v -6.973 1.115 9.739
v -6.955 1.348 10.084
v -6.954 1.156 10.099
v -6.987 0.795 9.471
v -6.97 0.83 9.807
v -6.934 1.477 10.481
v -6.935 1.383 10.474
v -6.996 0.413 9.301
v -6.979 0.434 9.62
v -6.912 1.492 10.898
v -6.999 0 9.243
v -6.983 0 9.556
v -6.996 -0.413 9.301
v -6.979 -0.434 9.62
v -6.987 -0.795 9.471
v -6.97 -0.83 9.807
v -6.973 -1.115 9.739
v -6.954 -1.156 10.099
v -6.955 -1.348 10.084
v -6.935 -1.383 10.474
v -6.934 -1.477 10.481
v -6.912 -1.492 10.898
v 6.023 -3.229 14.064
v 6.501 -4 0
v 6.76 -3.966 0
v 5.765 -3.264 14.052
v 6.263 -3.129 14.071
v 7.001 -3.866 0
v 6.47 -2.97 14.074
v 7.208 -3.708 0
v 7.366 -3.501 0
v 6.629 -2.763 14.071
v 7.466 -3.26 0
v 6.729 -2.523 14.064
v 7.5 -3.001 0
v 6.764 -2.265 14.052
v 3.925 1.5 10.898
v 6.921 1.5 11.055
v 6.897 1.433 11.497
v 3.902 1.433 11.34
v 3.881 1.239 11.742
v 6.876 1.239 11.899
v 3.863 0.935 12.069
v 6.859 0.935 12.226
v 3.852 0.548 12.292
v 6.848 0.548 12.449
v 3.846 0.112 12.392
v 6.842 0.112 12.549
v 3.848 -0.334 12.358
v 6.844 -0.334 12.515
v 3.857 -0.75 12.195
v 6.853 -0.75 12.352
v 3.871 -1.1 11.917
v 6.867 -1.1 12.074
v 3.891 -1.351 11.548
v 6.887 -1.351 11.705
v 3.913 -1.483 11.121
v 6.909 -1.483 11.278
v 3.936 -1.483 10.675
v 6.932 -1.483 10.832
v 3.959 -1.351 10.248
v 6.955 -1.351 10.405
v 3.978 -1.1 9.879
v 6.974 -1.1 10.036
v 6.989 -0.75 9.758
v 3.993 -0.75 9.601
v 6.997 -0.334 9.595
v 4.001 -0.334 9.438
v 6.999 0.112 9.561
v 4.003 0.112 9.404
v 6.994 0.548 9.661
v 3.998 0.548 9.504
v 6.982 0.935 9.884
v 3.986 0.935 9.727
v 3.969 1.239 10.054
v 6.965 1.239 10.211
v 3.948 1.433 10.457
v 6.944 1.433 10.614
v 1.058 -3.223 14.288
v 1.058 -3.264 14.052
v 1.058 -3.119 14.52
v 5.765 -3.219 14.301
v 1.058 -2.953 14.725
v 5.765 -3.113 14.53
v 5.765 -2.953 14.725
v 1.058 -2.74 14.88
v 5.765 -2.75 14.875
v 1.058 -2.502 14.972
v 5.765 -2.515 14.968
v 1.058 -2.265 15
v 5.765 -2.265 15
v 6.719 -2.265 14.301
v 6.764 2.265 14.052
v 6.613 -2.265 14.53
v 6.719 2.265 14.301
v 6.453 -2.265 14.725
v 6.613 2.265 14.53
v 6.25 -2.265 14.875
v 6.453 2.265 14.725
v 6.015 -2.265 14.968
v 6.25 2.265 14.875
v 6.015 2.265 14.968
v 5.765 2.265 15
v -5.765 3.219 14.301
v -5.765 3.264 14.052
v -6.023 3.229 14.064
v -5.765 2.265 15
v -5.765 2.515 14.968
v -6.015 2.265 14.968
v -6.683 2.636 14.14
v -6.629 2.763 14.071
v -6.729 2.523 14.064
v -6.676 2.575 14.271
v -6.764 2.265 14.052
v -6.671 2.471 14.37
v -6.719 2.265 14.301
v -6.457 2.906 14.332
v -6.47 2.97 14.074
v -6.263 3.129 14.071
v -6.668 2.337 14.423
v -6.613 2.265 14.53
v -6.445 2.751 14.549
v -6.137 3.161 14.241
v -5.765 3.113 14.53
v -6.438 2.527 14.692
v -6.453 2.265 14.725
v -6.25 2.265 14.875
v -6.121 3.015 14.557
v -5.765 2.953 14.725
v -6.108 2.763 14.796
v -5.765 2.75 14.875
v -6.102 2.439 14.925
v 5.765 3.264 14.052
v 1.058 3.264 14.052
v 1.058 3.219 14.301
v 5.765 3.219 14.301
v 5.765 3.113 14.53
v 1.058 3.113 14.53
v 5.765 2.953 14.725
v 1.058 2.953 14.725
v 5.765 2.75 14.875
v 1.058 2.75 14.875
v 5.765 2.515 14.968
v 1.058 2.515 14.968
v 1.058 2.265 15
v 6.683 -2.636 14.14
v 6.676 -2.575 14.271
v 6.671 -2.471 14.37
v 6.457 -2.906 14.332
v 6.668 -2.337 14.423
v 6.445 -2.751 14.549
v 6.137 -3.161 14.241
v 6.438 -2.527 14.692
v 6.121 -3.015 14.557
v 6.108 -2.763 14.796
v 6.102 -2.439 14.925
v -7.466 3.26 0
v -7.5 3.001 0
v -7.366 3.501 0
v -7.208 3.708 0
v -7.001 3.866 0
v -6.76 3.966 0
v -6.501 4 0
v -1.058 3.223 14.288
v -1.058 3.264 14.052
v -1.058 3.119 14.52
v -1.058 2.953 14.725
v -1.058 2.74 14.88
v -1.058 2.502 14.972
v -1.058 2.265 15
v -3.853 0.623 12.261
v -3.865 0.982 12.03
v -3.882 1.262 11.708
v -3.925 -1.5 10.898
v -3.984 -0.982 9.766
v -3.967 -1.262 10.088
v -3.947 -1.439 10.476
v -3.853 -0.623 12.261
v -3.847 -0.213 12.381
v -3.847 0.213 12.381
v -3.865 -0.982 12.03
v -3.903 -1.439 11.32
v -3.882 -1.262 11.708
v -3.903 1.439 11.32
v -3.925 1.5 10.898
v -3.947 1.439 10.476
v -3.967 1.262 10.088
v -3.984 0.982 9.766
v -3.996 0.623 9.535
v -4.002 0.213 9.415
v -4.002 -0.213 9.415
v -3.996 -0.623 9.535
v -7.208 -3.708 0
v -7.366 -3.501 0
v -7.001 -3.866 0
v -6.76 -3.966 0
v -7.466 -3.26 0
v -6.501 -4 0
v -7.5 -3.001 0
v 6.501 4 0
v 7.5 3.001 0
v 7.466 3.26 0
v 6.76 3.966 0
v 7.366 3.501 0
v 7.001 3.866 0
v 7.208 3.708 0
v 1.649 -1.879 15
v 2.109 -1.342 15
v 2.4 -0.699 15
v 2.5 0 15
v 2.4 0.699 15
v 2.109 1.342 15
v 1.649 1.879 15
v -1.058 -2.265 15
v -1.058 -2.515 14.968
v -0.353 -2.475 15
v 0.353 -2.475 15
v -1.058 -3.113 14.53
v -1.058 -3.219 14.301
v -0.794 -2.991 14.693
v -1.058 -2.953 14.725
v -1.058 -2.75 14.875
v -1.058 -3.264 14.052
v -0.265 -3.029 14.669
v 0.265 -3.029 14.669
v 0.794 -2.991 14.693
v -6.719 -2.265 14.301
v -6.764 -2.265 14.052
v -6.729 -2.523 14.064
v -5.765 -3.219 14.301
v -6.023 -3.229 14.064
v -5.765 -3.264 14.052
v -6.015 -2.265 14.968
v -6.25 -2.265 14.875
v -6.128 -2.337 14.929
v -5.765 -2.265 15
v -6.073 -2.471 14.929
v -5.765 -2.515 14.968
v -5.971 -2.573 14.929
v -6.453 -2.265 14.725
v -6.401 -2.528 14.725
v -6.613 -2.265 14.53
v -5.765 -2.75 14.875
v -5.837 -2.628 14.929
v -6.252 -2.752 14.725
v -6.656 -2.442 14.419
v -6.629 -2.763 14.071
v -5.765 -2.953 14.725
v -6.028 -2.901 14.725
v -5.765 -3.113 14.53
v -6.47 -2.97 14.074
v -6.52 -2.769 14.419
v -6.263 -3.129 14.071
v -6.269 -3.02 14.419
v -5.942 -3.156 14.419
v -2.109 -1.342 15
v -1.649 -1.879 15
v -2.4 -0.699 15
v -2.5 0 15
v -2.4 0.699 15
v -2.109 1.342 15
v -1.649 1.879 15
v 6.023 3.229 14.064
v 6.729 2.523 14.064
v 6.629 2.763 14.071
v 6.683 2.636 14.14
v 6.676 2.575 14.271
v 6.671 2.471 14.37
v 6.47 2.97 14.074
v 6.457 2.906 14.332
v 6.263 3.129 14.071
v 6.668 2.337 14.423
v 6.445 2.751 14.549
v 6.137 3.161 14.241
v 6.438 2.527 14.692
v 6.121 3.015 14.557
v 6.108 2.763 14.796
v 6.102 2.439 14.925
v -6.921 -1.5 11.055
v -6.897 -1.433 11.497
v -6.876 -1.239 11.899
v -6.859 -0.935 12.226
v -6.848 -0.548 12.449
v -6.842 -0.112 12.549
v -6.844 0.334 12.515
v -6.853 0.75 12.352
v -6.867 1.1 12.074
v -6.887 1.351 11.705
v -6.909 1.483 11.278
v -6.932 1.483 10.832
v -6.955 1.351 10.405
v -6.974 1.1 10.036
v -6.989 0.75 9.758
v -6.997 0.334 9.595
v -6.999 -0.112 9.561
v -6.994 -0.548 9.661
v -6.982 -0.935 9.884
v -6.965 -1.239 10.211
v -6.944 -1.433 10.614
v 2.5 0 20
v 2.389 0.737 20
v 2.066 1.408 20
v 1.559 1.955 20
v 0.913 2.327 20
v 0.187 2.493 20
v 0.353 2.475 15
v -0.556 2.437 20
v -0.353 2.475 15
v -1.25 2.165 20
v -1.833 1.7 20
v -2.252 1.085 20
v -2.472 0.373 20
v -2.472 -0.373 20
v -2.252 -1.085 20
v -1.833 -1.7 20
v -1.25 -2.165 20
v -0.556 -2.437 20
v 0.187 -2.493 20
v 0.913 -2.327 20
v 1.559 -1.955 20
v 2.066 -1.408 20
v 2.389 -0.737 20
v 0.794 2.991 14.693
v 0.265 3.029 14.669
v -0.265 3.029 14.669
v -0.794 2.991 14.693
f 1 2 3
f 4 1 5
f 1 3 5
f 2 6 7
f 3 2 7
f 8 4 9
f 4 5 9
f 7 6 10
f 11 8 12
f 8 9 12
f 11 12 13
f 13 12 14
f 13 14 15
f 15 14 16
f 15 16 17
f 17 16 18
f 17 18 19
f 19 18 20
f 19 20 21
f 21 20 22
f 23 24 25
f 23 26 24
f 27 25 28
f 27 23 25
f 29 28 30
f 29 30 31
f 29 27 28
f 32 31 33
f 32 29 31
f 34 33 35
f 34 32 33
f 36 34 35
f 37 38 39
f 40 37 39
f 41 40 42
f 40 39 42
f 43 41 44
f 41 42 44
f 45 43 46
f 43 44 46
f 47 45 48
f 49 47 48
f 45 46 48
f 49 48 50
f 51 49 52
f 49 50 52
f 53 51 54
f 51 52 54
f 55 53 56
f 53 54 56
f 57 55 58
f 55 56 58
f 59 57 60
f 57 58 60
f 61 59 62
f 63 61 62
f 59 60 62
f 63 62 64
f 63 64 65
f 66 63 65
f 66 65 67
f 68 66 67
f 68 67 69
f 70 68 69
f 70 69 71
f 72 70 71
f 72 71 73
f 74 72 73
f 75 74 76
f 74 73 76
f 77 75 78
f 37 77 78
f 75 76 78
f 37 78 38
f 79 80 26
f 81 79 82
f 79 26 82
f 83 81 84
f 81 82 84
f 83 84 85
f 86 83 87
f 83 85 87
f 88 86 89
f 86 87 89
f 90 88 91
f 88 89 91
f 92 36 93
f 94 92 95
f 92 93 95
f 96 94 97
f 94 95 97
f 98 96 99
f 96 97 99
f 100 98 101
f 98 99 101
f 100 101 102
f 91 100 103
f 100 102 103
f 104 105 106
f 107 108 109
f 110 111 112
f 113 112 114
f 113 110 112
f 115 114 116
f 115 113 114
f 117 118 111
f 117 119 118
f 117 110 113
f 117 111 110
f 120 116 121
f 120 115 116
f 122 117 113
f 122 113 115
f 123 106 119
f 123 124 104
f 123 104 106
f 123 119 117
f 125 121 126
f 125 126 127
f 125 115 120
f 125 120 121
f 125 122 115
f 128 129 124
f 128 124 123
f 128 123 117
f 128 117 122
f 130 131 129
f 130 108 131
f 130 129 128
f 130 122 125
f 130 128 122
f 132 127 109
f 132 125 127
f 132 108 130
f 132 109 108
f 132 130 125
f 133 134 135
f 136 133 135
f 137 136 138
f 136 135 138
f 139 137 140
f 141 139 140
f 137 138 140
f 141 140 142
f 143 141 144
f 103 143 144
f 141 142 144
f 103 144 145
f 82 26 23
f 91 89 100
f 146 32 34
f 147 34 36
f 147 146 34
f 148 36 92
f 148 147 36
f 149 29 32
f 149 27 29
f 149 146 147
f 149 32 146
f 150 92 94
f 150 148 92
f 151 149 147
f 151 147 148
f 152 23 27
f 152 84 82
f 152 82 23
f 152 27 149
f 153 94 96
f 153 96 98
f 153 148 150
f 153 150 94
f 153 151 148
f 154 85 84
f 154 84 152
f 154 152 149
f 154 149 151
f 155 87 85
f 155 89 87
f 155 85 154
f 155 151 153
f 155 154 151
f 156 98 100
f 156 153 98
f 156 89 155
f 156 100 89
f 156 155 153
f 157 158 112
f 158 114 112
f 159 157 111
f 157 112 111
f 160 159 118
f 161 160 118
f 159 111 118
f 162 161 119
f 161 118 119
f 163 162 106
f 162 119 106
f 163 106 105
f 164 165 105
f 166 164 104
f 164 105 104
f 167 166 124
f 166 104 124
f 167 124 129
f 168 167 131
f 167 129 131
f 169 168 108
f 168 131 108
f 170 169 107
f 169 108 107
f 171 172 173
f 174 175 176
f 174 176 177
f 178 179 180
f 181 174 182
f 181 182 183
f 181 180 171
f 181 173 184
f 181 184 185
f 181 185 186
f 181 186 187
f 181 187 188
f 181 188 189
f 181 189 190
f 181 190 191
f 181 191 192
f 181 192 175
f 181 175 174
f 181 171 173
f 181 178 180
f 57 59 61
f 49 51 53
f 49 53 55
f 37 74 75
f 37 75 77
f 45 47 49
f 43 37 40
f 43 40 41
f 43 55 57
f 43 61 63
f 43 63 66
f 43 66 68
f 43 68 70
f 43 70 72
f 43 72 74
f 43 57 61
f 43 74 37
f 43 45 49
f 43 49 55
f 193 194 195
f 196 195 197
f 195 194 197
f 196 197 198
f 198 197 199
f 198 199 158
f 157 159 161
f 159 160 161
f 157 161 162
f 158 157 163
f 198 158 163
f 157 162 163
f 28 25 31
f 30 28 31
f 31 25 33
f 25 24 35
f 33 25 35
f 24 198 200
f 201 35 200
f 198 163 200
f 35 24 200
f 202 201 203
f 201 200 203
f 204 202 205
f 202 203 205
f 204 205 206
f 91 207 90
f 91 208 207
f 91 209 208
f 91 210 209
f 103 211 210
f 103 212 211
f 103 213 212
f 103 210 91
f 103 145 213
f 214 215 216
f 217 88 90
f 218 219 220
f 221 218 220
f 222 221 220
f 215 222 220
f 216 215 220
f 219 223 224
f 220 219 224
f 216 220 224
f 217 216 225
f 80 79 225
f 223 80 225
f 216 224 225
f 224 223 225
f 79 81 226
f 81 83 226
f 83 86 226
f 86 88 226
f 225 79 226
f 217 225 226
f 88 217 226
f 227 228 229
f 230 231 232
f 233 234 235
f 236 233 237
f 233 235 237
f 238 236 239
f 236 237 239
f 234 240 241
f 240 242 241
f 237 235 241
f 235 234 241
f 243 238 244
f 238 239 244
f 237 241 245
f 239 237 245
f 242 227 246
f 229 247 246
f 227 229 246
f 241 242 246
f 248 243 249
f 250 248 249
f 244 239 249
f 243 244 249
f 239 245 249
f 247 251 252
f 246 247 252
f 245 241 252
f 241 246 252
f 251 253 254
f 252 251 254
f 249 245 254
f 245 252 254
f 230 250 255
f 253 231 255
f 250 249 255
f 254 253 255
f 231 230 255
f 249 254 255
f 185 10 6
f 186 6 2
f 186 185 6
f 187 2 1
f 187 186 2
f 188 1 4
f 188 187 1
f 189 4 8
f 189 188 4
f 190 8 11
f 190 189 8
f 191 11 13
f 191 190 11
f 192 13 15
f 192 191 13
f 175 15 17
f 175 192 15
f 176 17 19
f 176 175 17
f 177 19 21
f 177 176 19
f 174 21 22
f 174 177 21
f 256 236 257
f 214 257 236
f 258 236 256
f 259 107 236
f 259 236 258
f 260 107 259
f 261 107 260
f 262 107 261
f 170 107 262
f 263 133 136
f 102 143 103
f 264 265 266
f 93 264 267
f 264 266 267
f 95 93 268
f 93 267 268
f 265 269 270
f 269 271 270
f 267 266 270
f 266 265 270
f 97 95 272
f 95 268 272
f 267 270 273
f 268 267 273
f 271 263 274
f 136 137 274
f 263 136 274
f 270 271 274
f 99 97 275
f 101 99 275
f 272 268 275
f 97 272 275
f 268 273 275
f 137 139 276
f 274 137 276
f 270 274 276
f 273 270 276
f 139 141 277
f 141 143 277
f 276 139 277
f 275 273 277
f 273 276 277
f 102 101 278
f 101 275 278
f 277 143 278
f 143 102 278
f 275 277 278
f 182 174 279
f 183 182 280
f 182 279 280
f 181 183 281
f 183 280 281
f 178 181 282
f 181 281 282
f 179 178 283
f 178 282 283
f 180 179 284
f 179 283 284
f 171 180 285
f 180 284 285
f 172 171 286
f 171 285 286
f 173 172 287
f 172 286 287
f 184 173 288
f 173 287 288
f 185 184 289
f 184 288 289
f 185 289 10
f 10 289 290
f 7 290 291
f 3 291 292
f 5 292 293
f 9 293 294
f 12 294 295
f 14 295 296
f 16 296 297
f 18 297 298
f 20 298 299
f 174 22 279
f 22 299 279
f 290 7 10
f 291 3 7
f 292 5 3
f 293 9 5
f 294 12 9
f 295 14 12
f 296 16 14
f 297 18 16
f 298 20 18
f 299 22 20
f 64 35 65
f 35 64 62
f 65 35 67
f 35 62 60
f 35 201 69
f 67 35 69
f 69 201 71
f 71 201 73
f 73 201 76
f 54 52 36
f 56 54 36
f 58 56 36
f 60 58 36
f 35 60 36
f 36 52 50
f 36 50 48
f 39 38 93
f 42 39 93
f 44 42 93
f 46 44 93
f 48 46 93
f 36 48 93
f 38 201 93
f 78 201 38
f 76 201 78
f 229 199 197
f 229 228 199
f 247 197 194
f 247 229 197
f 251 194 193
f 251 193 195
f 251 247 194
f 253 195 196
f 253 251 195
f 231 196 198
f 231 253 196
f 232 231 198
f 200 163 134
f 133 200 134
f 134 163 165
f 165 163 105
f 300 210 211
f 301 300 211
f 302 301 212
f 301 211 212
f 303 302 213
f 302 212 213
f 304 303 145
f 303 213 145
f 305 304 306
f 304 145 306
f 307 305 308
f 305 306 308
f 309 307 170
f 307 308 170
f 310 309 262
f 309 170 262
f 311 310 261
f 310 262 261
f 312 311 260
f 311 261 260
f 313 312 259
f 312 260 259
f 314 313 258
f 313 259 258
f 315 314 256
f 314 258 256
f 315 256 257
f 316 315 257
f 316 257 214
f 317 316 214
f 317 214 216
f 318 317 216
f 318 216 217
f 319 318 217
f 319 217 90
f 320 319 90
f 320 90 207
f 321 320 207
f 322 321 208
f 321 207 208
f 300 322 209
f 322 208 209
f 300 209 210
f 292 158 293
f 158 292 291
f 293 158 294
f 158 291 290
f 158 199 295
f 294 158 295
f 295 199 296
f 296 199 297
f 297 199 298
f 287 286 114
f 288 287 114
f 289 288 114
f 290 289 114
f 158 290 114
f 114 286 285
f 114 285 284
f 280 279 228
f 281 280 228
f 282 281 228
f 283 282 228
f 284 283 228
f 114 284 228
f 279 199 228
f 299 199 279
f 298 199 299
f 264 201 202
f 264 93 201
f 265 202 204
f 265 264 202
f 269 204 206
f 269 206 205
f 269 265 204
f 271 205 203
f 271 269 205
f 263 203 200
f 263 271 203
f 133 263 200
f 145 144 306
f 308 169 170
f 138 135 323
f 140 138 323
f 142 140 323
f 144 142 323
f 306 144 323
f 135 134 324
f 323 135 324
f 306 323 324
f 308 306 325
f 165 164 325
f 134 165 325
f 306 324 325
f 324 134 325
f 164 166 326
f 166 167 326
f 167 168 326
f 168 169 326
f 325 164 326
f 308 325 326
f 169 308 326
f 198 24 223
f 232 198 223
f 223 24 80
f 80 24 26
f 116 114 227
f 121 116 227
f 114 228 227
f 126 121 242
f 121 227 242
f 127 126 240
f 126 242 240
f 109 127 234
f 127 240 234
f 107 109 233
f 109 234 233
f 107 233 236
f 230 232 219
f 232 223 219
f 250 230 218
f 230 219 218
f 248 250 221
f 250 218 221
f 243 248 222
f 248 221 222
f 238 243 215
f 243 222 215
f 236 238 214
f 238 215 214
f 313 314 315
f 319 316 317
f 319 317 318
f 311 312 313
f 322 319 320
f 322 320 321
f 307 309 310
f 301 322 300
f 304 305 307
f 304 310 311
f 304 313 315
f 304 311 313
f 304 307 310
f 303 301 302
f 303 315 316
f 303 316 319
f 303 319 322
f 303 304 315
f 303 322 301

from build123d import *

# Parameters (mm, degrees)
F0_W      = 15
F0_H      = 8
F1_DEPTH  = 15
F1_TAPER  = 3
F2_R      = 2.5
F3_DEPTH  = 5
F4_R      = 1
F5_R      = 1.5
F6_DEPTH  = 3
F7_R      = 1.5
F6_FACE_R = 1.5
F8_DEPTH  = 3


with BuildPart() as f1:
    # F0 (on Top) → F1 (new body)
    with BuildSketch(Plane.XY):
        Rectangle(F0_W, F0_H)
    extrude(amount=F1_DEPTH, taper=F1_TAPER)

    # F2 (on face) → F3 (join)
    with BuildSketch(Plane.XY.offset(15)):
        Circle(F2_R)
    extrude(amount=F3_DEPTH)

    # F4
    f4_edges = [f1.edges().sort_by_distance(p)[0] for p in [
        (0, 3.213883, 15),
        (-7.106942, 3.606942, 7.5),
        (7.106942, 3.606942, 7.5),
        (-7.106942, -3.606942, 7.5),
        (-6.713883, 0, 15),
        (0, -3.213883, 15),
        (7.106942, -3.606942, 7.5),
        (6.713883, 0, 15),
    ]]
    fillet(f4_edges, radius=F4_R)

    # F5 (on face) → F6 (cut)
    with BuildSketch(Plane(origin=(-7.4794571076, 0, 0.3919817373), x_dir=(0, -1, 0), z_dir=(-0.9986295348, 0, 0.0523359562))):
        with Locations((0, 10.6777304862)):
            Circle(F5_R)
    extrude(amount=-F6_DEPTH, mode=Mode.SUBTRACT)

    # F7 (on face) + F6_face (on face) → F8 (cut)
    with BuildSketch(Plane(origin=(7.4794571076, 0, 0.3919817373), x_dir=(0, 1, 0), z_dir=(0.9986295348, 0, 0.0523359562))):
        with Locations((0, 10.6777304862)):
            Circle(F7_R)
    with BuildSketch(Plane(origin=(-3.9247392679, 0, 10.8980708962), x_dir=(0, -1, 0), z_dir=(-0.9986295348, 0, 0.0523359562))):
        Circle(F6_FACE_R)
    extrude(amount=-F8_DEPTH, dir=(0.9986295348, 0, 0.0523359562), mode=Mode.SUBTRACT)


solid = f1.part
